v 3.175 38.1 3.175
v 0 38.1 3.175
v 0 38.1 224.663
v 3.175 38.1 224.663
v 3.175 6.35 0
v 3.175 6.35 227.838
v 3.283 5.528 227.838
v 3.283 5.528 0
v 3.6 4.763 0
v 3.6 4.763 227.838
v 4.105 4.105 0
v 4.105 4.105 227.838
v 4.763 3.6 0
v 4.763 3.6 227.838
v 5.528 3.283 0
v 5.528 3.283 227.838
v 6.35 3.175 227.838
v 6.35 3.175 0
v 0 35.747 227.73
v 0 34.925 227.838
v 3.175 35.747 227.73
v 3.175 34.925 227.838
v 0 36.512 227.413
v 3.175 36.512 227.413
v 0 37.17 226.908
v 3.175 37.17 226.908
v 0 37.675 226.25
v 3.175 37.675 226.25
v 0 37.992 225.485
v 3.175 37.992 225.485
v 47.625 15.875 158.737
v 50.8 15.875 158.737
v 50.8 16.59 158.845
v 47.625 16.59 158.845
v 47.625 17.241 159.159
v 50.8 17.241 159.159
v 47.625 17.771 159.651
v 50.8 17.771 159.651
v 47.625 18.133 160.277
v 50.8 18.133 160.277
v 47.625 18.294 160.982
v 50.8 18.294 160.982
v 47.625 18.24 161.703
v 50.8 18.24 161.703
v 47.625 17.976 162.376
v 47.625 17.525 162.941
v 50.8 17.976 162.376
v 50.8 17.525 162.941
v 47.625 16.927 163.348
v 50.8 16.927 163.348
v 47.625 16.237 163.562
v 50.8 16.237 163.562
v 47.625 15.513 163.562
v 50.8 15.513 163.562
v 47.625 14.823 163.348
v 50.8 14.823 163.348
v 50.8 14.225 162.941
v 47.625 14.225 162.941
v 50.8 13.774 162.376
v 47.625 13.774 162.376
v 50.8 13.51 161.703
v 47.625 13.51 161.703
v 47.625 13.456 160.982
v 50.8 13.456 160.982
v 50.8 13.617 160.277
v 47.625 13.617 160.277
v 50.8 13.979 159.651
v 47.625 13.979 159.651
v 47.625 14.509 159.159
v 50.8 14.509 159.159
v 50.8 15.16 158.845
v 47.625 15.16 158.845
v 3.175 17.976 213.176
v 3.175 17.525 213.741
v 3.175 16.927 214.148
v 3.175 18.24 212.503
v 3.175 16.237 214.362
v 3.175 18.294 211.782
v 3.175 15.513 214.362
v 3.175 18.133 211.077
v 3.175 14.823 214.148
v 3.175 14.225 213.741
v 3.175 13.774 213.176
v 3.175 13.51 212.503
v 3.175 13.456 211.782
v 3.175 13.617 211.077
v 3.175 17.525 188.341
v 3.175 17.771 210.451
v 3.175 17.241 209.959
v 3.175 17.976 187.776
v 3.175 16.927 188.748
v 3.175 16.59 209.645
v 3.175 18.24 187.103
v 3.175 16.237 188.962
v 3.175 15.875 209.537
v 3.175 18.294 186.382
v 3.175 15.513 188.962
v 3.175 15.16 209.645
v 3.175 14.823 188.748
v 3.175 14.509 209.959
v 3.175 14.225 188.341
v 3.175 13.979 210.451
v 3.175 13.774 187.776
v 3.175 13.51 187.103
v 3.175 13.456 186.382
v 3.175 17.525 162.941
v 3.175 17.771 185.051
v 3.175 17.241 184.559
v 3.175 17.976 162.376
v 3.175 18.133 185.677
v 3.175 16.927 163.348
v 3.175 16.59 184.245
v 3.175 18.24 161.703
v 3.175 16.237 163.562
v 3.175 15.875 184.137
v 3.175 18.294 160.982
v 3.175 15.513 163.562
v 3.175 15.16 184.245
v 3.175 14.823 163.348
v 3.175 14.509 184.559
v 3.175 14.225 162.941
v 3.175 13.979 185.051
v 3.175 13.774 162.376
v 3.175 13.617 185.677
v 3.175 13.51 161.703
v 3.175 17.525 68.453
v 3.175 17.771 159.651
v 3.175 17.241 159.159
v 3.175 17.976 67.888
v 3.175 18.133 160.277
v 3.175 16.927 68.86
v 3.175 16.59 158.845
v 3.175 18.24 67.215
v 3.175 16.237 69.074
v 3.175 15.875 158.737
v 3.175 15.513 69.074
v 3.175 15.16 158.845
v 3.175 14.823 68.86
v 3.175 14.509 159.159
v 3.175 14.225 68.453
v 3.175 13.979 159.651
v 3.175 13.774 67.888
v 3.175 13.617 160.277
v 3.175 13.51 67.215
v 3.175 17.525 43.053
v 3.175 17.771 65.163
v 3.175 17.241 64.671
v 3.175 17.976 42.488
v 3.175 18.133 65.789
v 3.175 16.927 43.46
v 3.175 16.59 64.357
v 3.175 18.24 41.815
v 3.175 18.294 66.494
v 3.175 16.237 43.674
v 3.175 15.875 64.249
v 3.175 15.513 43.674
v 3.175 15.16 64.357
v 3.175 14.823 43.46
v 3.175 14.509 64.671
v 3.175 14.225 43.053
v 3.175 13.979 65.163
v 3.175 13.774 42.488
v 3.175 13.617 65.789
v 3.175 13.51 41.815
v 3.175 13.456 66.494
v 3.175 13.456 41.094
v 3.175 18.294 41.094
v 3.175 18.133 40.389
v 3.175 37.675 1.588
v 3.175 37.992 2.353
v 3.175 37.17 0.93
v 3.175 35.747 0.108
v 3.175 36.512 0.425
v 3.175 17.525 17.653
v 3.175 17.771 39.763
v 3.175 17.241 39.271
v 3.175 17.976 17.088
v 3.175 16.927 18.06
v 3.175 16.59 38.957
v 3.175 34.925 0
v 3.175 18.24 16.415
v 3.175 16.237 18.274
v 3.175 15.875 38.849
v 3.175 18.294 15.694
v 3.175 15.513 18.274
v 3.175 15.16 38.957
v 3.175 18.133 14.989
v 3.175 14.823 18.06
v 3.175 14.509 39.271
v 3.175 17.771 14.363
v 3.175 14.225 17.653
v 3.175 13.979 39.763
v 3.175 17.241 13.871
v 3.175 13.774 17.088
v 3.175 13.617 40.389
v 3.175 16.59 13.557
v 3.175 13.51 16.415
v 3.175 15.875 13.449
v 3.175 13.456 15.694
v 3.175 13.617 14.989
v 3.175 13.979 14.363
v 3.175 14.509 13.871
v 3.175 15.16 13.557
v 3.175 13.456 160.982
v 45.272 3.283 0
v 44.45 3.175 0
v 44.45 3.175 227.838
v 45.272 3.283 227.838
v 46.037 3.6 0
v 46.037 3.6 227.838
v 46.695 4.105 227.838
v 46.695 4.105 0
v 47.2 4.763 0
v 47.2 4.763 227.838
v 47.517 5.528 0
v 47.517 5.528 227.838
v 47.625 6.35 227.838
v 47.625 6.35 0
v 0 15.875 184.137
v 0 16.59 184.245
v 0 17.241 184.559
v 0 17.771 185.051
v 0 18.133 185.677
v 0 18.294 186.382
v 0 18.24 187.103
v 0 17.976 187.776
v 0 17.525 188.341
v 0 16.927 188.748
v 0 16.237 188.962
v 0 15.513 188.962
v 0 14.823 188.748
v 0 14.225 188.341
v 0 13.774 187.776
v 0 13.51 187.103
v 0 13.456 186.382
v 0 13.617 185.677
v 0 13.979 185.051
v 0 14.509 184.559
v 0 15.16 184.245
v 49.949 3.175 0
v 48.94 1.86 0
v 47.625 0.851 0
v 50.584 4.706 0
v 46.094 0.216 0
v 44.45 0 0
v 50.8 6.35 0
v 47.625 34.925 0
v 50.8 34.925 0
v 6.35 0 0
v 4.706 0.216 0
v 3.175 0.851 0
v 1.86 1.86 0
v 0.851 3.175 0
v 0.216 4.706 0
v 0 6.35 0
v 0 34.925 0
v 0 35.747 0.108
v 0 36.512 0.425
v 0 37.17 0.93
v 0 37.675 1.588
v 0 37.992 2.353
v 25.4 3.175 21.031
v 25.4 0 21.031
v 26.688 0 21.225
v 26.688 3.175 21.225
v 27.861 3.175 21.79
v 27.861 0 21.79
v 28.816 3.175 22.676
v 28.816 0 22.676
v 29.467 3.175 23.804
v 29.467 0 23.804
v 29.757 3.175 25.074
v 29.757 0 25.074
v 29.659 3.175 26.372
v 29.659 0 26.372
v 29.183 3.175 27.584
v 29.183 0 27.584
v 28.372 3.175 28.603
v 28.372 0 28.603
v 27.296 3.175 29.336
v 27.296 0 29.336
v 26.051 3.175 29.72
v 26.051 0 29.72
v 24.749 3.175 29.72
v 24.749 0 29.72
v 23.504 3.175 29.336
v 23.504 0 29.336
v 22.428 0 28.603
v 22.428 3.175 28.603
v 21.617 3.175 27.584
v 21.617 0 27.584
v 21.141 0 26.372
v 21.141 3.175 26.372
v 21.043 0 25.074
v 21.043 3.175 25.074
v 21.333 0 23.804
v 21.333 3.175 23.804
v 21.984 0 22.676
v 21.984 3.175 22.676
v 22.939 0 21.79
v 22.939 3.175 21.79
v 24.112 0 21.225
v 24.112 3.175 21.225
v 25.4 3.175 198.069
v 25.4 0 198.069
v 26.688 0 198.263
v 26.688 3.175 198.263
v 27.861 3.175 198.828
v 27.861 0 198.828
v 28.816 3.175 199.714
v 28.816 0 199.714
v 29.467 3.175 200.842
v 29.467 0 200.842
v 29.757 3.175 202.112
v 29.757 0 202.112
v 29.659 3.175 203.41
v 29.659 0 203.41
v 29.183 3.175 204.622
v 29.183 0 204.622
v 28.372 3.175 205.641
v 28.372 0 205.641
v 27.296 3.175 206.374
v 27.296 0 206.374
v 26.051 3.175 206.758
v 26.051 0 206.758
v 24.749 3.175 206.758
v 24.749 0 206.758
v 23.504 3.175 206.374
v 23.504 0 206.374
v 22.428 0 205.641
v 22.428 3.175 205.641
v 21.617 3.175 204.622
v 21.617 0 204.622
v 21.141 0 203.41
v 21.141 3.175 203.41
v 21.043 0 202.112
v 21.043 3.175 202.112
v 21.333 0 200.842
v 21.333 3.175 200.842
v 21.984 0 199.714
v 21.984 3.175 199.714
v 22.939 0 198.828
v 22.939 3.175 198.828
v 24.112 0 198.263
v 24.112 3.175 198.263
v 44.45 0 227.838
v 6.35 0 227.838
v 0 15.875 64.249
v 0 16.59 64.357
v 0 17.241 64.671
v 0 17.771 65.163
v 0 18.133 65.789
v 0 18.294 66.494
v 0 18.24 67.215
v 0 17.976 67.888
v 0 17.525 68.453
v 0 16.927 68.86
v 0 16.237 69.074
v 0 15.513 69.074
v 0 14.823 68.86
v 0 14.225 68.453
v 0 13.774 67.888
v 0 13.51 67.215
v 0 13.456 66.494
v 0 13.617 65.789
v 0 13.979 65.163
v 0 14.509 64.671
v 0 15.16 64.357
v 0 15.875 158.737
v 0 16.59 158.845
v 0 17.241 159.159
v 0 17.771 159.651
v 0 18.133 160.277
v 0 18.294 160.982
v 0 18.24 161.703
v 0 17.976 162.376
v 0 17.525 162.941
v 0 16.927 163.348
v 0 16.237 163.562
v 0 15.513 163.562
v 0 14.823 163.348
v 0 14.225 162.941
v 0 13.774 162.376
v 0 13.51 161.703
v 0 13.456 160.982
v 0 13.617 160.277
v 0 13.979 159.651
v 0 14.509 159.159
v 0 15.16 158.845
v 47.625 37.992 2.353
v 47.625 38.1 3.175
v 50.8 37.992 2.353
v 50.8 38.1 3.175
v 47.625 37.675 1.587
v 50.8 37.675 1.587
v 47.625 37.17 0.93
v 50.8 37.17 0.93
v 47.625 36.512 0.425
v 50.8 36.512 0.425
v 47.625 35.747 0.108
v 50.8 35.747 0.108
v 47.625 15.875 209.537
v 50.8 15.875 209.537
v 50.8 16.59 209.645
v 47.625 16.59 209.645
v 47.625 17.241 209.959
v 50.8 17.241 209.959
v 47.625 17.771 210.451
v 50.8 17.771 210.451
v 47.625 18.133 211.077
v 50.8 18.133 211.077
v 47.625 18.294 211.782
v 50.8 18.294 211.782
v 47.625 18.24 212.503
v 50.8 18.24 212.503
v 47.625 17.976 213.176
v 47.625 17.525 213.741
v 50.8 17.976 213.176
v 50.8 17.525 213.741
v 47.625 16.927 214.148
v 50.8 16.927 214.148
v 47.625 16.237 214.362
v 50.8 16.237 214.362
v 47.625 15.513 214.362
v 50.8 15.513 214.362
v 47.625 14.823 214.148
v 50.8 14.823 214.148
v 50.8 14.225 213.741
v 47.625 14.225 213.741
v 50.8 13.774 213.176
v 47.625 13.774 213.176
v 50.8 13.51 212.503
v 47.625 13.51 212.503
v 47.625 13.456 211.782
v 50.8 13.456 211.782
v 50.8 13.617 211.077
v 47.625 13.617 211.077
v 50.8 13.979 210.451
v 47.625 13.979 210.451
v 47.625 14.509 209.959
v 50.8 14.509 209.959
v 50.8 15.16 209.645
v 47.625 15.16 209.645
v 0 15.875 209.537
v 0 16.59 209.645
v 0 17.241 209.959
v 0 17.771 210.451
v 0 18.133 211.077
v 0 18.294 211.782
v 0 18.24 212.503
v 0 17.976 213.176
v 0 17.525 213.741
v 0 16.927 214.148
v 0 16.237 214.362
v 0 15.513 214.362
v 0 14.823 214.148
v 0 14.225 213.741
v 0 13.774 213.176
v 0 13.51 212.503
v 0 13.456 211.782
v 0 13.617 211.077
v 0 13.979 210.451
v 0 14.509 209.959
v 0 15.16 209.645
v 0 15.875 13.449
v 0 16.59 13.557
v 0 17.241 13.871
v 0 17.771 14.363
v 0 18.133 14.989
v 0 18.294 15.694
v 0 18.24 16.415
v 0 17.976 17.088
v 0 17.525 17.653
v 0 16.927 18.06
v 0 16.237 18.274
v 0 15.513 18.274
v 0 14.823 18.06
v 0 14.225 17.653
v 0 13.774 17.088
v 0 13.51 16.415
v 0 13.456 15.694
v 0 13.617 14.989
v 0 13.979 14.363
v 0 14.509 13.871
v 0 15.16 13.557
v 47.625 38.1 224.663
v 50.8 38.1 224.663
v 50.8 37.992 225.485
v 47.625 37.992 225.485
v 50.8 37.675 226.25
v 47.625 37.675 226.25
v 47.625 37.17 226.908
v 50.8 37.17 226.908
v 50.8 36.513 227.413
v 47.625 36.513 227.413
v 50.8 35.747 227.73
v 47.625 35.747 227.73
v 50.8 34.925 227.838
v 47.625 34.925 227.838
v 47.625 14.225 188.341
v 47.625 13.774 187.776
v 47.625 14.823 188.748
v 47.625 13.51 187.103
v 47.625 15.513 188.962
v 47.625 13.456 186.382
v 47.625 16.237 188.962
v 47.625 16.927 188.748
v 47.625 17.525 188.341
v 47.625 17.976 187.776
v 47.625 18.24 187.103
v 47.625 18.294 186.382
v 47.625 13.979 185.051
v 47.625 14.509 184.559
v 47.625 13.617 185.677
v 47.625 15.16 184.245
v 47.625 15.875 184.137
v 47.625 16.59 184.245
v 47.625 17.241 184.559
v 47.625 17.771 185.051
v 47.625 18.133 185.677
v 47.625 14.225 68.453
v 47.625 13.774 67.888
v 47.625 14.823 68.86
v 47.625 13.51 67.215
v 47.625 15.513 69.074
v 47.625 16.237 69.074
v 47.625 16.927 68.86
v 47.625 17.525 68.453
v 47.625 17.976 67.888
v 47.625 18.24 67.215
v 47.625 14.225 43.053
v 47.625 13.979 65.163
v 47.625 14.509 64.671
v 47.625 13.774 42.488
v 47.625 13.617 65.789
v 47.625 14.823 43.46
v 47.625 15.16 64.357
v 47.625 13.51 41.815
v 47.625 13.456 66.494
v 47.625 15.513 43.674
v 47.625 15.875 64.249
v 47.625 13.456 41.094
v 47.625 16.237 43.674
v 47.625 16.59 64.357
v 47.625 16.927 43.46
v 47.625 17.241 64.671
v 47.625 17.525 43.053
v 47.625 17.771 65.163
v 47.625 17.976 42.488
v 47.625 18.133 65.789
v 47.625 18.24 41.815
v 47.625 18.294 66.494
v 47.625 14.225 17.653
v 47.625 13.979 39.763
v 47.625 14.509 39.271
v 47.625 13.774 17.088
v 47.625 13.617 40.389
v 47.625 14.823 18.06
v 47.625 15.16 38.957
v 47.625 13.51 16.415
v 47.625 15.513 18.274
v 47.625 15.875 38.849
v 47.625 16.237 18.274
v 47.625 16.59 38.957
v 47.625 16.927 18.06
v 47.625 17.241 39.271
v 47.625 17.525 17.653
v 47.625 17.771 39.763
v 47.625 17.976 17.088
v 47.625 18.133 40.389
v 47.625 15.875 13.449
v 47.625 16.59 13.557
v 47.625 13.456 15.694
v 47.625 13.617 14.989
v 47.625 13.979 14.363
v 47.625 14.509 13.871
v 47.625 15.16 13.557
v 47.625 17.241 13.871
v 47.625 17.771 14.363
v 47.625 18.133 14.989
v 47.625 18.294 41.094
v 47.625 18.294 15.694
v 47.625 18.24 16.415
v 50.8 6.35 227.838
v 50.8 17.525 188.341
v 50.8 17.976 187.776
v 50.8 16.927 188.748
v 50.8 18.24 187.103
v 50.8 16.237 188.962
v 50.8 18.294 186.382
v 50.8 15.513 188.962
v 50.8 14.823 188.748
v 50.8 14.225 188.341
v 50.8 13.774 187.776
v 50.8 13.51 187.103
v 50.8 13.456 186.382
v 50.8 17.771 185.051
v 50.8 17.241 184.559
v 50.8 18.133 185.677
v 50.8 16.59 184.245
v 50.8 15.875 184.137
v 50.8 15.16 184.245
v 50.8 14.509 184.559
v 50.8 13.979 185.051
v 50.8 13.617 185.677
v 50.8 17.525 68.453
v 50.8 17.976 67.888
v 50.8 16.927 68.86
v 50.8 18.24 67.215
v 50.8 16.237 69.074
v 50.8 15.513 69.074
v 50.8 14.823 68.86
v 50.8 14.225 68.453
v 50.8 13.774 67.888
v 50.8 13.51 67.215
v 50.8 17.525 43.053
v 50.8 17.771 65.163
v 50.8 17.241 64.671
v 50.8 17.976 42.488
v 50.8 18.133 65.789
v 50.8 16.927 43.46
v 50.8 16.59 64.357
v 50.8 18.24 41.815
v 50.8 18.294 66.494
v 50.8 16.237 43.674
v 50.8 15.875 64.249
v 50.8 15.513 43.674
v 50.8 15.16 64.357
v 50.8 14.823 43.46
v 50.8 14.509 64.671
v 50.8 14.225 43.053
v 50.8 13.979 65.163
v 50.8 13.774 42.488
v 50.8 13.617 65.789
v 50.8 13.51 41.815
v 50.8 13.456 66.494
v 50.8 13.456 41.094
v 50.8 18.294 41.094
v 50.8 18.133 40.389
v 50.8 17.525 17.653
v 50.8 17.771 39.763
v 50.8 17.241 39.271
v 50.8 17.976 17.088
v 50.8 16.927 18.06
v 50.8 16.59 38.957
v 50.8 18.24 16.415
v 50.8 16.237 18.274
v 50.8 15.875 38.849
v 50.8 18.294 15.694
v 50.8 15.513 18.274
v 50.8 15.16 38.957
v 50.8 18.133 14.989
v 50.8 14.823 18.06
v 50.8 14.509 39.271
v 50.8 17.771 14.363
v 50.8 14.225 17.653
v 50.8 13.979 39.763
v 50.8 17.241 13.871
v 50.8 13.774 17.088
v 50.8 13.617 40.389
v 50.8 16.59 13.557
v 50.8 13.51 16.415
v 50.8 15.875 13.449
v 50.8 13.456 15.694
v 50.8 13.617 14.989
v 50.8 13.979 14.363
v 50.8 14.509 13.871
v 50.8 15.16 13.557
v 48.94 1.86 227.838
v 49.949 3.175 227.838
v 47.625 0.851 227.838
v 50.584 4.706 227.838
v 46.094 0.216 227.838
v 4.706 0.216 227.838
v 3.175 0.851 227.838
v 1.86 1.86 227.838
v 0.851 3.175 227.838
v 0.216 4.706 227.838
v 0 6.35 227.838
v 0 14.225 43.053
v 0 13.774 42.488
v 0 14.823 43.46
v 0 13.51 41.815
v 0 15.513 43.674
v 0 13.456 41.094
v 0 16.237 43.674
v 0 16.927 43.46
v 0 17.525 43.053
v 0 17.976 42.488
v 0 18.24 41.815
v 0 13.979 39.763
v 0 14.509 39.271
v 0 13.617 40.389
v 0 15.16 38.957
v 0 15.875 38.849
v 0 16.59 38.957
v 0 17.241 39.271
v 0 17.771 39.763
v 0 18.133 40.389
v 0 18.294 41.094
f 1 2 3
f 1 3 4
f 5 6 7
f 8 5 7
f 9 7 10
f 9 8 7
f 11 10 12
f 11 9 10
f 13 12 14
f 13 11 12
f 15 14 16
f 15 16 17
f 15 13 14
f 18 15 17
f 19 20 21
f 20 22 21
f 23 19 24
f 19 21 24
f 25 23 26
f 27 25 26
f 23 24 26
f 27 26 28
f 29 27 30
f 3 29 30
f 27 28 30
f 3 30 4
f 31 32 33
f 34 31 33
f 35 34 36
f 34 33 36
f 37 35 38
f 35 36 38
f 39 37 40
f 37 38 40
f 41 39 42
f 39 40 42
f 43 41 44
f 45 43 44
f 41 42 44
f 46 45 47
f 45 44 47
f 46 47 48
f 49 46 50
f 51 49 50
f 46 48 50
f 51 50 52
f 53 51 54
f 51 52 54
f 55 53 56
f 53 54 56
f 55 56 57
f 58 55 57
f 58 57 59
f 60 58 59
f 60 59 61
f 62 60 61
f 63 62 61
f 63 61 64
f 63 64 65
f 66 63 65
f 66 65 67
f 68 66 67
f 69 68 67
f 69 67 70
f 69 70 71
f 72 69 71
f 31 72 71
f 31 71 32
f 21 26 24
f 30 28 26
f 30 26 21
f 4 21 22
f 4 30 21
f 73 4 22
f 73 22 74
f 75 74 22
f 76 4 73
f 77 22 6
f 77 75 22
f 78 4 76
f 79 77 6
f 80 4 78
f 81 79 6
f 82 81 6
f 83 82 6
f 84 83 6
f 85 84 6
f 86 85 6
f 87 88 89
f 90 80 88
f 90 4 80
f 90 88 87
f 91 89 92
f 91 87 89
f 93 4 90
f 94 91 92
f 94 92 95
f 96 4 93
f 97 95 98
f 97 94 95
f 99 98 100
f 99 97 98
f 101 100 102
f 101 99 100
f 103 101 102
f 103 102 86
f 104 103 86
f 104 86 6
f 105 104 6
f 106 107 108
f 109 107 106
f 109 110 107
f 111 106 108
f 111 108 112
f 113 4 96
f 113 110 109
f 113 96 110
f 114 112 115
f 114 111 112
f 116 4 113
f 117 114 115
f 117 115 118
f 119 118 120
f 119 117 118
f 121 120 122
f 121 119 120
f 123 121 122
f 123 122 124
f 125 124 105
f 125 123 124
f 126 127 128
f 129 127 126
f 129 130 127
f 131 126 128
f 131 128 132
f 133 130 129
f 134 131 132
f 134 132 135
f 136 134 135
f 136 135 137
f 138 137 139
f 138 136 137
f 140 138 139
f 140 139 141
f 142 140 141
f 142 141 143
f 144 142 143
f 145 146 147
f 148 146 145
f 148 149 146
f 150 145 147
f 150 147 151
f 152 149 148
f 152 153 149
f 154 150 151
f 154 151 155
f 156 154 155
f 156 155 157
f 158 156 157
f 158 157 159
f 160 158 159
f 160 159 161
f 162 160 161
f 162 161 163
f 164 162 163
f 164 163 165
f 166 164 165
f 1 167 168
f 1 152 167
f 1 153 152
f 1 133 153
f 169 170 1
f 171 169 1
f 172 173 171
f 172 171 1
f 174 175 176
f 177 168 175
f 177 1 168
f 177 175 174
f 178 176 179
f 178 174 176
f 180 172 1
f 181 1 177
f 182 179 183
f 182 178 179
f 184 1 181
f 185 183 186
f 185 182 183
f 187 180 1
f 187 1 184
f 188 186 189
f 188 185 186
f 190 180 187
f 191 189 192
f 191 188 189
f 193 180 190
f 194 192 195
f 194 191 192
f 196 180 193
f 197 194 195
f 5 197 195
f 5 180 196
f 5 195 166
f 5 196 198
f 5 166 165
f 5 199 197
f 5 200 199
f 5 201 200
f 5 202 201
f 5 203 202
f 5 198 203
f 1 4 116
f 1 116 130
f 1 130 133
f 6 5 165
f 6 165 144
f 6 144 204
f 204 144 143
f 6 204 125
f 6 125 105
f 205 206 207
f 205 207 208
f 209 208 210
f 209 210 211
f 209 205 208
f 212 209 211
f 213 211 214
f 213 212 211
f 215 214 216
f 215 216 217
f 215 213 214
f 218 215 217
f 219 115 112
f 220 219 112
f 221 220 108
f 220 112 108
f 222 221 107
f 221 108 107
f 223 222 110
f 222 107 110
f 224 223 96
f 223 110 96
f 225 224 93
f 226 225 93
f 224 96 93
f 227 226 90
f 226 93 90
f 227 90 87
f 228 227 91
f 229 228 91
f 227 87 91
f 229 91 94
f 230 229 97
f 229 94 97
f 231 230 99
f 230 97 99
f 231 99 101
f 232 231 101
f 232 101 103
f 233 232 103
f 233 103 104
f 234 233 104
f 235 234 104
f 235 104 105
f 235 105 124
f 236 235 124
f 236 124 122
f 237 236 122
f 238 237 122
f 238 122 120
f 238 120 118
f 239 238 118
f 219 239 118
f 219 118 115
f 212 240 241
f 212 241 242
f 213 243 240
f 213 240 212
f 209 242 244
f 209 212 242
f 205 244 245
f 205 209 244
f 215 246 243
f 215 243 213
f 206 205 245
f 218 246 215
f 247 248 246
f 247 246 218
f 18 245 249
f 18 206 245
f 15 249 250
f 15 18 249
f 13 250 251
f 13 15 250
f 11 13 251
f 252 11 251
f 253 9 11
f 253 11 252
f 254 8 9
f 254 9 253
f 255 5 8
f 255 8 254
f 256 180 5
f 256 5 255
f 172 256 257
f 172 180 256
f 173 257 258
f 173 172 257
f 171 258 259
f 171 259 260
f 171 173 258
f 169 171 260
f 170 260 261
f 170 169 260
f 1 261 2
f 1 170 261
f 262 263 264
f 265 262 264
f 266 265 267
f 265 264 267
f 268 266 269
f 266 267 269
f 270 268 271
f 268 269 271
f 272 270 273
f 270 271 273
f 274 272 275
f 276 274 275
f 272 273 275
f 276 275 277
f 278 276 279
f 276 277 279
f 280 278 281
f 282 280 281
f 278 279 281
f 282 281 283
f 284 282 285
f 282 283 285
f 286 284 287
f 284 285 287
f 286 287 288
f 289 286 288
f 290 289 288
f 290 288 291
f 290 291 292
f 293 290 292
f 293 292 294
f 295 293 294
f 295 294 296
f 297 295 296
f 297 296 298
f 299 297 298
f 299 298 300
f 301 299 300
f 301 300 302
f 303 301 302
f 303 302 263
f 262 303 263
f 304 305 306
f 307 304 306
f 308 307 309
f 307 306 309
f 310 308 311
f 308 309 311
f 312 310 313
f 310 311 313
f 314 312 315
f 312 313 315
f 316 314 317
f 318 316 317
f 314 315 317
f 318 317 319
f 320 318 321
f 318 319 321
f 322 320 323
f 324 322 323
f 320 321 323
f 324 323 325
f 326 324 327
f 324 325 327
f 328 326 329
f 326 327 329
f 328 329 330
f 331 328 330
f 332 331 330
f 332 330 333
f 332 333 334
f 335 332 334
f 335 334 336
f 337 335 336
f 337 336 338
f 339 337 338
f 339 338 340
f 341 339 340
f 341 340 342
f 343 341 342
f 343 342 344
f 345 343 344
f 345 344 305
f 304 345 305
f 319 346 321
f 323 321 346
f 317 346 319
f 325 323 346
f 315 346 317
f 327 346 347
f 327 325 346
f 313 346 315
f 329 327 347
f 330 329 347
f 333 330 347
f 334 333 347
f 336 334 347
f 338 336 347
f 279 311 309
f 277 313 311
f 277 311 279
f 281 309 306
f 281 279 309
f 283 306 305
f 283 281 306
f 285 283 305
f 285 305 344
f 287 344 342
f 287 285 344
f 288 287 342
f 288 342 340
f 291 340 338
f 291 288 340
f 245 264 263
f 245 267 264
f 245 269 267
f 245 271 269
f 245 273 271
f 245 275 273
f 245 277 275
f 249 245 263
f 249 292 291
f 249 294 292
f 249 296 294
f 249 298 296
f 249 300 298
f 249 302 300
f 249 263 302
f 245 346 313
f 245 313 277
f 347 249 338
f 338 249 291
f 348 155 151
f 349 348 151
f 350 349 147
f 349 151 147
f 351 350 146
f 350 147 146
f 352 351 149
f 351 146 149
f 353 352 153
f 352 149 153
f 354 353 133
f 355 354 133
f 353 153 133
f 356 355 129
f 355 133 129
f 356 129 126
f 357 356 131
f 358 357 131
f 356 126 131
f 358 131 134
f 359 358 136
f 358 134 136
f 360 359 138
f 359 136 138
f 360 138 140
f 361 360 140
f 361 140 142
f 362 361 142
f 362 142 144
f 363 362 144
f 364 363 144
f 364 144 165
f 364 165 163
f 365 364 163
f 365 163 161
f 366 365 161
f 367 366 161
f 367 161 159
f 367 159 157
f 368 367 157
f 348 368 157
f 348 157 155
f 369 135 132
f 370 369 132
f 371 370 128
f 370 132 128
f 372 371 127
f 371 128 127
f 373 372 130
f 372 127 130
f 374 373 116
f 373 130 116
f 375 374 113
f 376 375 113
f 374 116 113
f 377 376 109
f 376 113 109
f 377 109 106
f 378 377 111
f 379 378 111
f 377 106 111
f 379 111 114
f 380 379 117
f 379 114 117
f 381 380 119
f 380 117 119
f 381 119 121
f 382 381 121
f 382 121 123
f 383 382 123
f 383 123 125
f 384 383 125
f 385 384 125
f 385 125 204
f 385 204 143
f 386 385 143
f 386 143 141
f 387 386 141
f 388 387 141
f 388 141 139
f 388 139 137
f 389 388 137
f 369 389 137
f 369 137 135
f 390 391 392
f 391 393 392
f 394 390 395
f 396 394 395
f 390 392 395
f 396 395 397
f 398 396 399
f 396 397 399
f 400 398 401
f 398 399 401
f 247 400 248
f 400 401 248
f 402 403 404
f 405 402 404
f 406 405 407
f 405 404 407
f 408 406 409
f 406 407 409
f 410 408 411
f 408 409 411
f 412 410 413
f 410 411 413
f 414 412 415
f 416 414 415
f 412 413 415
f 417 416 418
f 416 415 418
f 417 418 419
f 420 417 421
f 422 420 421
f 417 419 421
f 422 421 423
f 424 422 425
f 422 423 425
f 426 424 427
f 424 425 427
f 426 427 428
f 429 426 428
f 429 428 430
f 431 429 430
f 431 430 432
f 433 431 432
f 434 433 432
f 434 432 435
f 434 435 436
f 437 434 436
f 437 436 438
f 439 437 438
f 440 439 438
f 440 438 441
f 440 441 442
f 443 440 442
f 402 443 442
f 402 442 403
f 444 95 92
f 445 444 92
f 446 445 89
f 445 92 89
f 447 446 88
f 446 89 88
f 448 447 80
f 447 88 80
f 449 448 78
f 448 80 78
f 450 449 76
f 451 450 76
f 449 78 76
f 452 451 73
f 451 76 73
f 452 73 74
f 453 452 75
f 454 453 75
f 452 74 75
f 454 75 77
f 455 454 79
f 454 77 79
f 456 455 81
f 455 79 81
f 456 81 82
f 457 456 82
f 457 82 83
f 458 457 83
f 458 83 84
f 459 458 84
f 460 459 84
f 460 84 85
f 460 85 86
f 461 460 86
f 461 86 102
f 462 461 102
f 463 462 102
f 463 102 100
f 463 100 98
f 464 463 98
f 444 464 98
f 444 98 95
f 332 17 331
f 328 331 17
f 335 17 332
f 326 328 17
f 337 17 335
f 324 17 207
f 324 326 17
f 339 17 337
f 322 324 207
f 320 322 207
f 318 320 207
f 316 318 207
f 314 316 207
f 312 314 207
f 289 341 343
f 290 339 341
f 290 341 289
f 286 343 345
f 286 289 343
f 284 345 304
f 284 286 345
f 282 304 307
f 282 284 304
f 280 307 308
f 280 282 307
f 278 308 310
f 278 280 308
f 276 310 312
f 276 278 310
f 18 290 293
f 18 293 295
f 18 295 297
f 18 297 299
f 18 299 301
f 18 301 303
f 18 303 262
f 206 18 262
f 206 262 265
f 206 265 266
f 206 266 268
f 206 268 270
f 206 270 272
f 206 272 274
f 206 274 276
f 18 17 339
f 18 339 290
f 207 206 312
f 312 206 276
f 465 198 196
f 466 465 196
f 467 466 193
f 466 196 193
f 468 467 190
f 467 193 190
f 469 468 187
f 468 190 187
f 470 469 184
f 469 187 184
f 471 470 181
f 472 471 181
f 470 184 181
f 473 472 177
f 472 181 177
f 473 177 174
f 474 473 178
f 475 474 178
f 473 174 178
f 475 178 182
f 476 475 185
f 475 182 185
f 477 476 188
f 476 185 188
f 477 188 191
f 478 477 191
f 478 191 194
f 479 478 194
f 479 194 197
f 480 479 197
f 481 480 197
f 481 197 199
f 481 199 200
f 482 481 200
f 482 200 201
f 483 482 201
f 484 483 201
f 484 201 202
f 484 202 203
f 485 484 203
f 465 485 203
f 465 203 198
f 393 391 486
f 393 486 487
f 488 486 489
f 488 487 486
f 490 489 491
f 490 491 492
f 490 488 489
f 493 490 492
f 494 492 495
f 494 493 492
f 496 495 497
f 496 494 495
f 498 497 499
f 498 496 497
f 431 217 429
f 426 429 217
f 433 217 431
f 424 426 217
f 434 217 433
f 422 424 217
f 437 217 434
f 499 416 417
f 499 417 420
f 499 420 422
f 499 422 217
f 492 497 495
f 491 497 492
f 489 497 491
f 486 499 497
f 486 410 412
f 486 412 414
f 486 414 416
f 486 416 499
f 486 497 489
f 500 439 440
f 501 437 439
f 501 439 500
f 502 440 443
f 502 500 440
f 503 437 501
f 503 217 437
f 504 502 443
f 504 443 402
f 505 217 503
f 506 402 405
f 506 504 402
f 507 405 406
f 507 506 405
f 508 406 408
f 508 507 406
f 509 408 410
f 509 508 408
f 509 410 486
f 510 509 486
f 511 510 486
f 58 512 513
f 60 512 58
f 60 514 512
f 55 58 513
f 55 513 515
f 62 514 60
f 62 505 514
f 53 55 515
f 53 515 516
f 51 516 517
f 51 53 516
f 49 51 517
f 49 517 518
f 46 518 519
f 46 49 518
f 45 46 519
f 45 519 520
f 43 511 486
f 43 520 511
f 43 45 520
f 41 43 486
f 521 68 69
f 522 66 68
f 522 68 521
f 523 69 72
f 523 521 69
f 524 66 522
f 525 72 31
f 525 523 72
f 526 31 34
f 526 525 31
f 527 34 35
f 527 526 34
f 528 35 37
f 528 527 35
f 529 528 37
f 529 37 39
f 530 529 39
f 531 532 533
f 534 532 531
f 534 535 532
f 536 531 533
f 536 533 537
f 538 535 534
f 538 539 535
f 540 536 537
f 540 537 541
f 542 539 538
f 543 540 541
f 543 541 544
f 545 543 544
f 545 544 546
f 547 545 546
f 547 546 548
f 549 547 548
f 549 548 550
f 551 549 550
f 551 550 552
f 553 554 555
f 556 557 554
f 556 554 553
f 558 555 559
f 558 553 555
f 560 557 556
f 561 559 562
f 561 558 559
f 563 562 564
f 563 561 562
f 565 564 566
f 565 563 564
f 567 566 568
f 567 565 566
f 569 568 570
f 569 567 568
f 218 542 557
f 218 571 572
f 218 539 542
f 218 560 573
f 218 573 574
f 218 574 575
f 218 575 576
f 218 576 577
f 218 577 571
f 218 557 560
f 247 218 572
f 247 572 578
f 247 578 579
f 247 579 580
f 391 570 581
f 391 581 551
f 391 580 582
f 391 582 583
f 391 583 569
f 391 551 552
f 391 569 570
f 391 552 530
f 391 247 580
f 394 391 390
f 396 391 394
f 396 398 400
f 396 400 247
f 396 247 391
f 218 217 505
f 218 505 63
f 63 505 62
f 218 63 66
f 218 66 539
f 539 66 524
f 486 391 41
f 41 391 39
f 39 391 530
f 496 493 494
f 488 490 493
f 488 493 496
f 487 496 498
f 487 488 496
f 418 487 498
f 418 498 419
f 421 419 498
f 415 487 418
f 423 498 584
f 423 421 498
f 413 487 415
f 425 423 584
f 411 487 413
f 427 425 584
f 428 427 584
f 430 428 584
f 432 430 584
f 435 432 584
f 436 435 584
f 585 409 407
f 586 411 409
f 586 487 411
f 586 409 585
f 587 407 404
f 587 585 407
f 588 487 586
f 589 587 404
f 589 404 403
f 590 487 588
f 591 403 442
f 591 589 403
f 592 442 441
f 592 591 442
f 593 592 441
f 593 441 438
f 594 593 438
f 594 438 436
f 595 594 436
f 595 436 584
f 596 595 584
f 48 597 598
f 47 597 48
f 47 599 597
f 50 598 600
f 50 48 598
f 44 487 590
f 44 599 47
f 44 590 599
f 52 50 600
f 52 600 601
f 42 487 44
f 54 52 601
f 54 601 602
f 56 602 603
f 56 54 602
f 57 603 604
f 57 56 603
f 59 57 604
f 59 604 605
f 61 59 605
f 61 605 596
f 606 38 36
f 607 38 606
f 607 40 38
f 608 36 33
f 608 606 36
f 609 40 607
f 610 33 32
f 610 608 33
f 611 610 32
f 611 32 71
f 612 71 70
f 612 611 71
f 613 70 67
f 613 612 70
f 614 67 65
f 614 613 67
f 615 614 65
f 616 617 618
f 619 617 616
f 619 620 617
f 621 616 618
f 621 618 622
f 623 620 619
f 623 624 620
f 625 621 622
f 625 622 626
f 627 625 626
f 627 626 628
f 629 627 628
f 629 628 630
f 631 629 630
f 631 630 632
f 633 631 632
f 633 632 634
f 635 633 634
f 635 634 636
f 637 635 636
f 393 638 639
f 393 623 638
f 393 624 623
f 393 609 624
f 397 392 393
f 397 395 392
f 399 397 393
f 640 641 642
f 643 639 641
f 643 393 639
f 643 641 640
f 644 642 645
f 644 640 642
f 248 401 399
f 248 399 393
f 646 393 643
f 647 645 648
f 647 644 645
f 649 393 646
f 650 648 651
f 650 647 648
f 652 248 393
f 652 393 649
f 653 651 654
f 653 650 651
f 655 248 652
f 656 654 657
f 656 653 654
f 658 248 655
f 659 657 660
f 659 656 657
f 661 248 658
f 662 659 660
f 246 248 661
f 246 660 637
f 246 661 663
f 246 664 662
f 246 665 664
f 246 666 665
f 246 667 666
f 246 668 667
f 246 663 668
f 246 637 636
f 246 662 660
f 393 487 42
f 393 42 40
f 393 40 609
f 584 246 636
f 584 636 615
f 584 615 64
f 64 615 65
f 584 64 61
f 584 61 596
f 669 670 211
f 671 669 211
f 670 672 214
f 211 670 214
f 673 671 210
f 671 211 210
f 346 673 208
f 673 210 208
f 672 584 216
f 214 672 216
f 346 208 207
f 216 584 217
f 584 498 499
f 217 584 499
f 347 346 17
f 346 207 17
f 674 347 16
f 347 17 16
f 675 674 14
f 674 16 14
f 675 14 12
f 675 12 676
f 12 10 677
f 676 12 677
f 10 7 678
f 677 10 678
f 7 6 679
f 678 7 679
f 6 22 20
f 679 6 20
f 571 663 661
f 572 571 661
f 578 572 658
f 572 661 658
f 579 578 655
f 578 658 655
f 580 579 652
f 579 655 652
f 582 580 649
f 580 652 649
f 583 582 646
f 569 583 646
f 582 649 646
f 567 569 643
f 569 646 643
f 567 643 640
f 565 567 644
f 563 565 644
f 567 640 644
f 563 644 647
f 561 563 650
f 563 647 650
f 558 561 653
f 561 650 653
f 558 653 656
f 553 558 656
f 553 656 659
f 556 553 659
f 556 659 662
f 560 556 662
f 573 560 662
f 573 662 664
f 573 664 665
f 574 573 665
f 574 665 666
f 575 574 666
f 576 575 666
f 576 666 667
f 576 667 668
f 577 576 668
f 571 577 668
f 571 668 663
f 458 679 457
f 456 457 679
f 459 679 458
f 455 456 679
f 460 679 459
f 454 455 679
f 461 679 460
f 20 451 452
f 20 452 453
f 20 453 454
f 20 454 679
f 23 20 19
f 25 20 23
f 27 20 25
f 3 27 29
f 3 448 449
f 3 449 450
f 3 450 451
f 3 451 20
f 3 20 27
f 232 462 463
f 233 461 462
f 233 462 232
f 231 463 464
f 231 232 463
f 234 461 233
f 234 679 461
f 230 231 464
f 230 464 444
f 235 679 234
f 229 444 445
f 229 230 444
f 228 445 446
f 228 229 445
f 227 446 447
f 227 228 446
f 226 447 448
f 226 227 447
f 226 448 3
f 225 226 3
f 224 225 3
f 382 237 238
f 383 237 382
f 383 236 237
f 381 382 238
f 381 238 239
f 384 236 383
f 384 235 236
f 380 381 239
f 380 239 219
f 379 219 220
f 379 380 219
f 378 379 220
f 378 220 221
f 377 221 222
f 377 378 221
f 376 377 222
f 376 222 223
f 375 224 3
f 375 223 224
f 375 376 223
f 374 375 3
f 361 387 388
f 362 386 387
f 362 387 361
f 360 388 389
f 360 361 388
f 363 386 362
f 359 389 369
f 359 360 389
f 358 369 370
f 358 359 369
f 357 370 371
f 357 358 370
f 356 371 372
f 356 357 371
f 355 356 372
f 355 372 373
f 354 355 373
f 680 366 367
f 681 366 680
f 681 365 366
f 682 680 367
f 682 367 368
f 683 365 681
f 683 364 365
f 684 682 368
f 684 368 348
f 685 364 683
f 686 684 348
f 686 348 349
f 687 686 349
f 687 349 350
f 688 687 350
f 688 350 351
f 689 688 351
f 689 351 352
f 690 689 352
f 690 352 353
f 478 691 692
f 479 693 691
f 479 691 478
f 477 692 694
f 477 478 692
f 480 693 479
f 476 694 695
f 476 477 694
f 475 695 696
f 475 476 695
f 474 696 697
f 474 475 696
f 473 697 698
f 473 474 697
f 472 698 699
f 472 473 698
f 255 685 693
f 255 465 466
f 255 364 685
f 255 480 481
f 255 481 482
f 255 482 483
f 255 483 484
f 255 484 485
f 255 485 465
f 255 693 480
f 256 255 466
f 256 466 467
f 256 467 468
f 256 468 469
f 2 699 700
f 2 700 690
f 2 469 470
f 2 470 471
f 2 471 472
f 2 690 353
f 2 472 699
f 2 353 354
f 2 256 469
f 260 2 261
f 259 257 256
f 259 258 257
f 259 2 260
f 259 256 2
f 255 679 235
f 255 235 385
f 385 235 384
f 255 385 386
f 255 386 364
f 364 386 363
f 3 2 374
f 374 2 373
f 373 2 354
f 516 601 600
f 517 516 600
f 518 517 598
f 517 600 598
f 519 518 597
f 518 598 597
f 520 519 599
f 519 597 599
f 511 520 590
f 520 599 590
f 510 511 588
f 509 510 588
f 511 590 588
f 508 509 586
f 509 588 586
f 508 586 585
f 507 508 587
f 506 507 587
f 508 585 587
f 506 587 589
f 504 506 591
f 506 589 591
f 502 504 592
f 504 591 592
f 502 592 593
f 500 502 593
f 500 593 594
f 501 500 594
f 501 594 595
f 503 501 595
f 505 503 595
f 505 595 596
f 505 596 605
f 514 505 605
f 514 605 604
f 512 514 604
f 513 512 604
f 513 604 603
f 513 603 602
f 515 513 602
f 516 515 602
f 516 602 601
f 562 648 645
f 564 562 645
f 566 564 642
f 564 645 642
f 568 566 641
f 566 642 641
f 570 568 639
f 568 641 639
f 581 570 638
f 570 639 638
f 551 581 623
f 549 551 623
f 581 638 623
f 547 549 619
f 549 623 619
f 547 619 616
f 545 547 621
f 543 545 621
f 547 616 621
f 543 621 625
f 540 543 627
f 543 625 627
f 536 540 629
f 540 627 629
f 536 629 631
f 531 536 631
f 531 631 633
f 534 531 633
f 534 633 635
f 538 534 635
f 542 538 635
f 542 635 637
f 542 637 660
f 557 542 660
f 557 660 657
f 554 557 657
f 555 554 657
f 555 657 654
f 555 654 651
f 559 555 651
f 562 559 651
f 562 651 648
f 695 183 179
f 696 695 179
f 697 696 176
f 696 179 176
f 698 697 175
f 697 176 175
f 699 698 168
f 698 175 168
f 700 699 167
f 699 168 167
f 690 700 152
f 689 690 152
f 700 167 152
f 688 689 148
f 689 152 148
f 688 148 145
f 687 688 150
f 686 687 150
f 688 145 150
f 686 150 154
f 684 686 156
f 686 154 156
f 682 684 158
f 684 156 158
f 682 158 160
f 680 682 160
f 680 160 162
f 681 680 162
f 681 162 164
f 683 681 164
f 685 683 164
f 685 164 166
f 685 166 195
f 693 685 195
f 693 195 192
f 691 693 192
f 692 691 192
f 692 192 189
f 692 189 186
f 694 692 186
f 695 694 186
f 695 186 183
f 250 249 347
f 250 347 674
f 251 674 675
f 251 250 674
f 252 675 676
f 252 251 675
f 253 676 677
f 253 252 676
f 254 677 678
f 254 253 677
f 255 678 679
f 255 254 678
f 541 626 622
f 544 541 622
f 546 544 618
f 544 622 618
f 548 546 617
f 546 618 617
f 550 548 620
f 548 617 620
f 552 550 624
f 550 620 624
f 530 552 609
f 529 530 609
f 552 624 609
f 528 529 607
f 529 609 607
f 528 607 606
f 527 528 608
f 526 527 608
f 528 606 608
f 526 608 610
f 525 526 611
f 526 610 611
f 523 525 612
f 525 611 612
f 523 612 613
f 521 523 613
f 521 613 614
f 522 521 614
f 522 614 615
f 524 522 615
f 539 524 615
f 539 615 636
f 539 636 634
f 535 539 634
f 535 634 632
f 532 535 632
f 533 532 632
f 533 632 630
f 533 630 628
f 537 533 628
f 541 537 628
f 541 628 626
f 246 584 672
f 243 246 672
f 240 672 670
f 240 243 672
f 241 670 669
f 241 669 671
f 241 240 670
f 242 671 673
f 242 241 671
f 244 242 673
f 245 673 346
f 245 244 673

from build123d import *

# Parameters (mm, degrees)
BASE_FLANGE1_DEPTH = 227.838
SKETCH6_R          = 2.4257
CUT_EXTRUDE1_DEPTH = 237.521466772
SKETCH7_R          = 4.3688
CUT_EXTRUDE2_DEPTH = 237.521466772
FILLET1_R          = 3.175


# Sheet-metal steps are written as plain solids
with BuildPart() as part:
    # Sketch1 → Base-Flange1 (new body)
    with BuildSketch(Plane.XY):
        with BuildLine():
            Line((50.8, 38.1), (50.8, 6.35))
            ThreePointArc((50.8, 6.35), (48.940128061, 1.859871939), (44.45, 0))
            Line((44.45, 0), (6.35, 0))
            ThreePointArc((6.35, 0), (1.859871939, 1.859871939), (0, 6.35))
            Line((0, 6.35), (0, 38.1))
            Line((0, 38.1), (3.175, 38.1))
            Line((3.175, 38.1), (3.175, 6.35))
            ThreePointArc((3.175, 6.35), (4.10493597, 4.10493597), (6.35, 3.175))
            Line((6.35, 3.175), (44.45, 3.175))
            ThreePointArc((44.45, 3.175), (46.69506403, 4.10493597), (47.625, 6.35))
            Line((47.625, 6.35), (47.625, 38.1))
            Line((47.625, 38.1), (50.8, 38.1))
        make_face()
    extrude(amount=BASE_FLANGE1_DEPTH)

    # Sketch6 → Cut-Extrude1 (cut, through all)
    with BuildSketch(Plane(origin=(50.8, 0, 0), x_dir=(0, 0, -1), z_dir=(1, 0, 0))):
        with Locations((-15.875, 15.875)):
            Circle(SKETCH6_R)
        with Locations((-41.275, 15.875)):
            Circle(SKETCH6_R)
        with Locations((-66.675, 15.875)):
            Circle(SKETCH6_R)
        with Locations((-161.163, 15.875)):
            Circle(SKETCH6_R)
        with Locations((-186.563, 15.875)):
            Circle(SKETCH6_R)
        with Locations((-211.963, 15.875)):
            Circle(SKETCH6_R)
    extrude(amount=-CUT_EXTRUDE1_DEPTH, mode=Mode.SUBTRACT)

    # Sketch7 → Cut-Extrude2 (cut, through all)
    with BuildSketch(Plane.XZ):
        with Locations(Location((25.4, 25.4, 0), (0, 0, 270))):
            Circle(SKETCH7_R)
        with Locations(Location((25.4, 202.438, 0), (0, 0, 270))):
            Circle(SKETCH7_R)
    extrude(amount=-CUT_EXTRUDE2_DEPTH, mode=Mode.SUBTRACT)

    # Fillet1
    fillet1_edges = [part.edges().sort_by_distance(p)[0] for p in [
        (1.5875, 38.1, 0),
        (49.2125, 38.1, 0),
        (1.5875, 38.1, 227.838),
        (49.2125, 38.1, 227.838),
    ]]
    fillet(fillet1_edges, radius=FILLET1_R)


solid = part.part
